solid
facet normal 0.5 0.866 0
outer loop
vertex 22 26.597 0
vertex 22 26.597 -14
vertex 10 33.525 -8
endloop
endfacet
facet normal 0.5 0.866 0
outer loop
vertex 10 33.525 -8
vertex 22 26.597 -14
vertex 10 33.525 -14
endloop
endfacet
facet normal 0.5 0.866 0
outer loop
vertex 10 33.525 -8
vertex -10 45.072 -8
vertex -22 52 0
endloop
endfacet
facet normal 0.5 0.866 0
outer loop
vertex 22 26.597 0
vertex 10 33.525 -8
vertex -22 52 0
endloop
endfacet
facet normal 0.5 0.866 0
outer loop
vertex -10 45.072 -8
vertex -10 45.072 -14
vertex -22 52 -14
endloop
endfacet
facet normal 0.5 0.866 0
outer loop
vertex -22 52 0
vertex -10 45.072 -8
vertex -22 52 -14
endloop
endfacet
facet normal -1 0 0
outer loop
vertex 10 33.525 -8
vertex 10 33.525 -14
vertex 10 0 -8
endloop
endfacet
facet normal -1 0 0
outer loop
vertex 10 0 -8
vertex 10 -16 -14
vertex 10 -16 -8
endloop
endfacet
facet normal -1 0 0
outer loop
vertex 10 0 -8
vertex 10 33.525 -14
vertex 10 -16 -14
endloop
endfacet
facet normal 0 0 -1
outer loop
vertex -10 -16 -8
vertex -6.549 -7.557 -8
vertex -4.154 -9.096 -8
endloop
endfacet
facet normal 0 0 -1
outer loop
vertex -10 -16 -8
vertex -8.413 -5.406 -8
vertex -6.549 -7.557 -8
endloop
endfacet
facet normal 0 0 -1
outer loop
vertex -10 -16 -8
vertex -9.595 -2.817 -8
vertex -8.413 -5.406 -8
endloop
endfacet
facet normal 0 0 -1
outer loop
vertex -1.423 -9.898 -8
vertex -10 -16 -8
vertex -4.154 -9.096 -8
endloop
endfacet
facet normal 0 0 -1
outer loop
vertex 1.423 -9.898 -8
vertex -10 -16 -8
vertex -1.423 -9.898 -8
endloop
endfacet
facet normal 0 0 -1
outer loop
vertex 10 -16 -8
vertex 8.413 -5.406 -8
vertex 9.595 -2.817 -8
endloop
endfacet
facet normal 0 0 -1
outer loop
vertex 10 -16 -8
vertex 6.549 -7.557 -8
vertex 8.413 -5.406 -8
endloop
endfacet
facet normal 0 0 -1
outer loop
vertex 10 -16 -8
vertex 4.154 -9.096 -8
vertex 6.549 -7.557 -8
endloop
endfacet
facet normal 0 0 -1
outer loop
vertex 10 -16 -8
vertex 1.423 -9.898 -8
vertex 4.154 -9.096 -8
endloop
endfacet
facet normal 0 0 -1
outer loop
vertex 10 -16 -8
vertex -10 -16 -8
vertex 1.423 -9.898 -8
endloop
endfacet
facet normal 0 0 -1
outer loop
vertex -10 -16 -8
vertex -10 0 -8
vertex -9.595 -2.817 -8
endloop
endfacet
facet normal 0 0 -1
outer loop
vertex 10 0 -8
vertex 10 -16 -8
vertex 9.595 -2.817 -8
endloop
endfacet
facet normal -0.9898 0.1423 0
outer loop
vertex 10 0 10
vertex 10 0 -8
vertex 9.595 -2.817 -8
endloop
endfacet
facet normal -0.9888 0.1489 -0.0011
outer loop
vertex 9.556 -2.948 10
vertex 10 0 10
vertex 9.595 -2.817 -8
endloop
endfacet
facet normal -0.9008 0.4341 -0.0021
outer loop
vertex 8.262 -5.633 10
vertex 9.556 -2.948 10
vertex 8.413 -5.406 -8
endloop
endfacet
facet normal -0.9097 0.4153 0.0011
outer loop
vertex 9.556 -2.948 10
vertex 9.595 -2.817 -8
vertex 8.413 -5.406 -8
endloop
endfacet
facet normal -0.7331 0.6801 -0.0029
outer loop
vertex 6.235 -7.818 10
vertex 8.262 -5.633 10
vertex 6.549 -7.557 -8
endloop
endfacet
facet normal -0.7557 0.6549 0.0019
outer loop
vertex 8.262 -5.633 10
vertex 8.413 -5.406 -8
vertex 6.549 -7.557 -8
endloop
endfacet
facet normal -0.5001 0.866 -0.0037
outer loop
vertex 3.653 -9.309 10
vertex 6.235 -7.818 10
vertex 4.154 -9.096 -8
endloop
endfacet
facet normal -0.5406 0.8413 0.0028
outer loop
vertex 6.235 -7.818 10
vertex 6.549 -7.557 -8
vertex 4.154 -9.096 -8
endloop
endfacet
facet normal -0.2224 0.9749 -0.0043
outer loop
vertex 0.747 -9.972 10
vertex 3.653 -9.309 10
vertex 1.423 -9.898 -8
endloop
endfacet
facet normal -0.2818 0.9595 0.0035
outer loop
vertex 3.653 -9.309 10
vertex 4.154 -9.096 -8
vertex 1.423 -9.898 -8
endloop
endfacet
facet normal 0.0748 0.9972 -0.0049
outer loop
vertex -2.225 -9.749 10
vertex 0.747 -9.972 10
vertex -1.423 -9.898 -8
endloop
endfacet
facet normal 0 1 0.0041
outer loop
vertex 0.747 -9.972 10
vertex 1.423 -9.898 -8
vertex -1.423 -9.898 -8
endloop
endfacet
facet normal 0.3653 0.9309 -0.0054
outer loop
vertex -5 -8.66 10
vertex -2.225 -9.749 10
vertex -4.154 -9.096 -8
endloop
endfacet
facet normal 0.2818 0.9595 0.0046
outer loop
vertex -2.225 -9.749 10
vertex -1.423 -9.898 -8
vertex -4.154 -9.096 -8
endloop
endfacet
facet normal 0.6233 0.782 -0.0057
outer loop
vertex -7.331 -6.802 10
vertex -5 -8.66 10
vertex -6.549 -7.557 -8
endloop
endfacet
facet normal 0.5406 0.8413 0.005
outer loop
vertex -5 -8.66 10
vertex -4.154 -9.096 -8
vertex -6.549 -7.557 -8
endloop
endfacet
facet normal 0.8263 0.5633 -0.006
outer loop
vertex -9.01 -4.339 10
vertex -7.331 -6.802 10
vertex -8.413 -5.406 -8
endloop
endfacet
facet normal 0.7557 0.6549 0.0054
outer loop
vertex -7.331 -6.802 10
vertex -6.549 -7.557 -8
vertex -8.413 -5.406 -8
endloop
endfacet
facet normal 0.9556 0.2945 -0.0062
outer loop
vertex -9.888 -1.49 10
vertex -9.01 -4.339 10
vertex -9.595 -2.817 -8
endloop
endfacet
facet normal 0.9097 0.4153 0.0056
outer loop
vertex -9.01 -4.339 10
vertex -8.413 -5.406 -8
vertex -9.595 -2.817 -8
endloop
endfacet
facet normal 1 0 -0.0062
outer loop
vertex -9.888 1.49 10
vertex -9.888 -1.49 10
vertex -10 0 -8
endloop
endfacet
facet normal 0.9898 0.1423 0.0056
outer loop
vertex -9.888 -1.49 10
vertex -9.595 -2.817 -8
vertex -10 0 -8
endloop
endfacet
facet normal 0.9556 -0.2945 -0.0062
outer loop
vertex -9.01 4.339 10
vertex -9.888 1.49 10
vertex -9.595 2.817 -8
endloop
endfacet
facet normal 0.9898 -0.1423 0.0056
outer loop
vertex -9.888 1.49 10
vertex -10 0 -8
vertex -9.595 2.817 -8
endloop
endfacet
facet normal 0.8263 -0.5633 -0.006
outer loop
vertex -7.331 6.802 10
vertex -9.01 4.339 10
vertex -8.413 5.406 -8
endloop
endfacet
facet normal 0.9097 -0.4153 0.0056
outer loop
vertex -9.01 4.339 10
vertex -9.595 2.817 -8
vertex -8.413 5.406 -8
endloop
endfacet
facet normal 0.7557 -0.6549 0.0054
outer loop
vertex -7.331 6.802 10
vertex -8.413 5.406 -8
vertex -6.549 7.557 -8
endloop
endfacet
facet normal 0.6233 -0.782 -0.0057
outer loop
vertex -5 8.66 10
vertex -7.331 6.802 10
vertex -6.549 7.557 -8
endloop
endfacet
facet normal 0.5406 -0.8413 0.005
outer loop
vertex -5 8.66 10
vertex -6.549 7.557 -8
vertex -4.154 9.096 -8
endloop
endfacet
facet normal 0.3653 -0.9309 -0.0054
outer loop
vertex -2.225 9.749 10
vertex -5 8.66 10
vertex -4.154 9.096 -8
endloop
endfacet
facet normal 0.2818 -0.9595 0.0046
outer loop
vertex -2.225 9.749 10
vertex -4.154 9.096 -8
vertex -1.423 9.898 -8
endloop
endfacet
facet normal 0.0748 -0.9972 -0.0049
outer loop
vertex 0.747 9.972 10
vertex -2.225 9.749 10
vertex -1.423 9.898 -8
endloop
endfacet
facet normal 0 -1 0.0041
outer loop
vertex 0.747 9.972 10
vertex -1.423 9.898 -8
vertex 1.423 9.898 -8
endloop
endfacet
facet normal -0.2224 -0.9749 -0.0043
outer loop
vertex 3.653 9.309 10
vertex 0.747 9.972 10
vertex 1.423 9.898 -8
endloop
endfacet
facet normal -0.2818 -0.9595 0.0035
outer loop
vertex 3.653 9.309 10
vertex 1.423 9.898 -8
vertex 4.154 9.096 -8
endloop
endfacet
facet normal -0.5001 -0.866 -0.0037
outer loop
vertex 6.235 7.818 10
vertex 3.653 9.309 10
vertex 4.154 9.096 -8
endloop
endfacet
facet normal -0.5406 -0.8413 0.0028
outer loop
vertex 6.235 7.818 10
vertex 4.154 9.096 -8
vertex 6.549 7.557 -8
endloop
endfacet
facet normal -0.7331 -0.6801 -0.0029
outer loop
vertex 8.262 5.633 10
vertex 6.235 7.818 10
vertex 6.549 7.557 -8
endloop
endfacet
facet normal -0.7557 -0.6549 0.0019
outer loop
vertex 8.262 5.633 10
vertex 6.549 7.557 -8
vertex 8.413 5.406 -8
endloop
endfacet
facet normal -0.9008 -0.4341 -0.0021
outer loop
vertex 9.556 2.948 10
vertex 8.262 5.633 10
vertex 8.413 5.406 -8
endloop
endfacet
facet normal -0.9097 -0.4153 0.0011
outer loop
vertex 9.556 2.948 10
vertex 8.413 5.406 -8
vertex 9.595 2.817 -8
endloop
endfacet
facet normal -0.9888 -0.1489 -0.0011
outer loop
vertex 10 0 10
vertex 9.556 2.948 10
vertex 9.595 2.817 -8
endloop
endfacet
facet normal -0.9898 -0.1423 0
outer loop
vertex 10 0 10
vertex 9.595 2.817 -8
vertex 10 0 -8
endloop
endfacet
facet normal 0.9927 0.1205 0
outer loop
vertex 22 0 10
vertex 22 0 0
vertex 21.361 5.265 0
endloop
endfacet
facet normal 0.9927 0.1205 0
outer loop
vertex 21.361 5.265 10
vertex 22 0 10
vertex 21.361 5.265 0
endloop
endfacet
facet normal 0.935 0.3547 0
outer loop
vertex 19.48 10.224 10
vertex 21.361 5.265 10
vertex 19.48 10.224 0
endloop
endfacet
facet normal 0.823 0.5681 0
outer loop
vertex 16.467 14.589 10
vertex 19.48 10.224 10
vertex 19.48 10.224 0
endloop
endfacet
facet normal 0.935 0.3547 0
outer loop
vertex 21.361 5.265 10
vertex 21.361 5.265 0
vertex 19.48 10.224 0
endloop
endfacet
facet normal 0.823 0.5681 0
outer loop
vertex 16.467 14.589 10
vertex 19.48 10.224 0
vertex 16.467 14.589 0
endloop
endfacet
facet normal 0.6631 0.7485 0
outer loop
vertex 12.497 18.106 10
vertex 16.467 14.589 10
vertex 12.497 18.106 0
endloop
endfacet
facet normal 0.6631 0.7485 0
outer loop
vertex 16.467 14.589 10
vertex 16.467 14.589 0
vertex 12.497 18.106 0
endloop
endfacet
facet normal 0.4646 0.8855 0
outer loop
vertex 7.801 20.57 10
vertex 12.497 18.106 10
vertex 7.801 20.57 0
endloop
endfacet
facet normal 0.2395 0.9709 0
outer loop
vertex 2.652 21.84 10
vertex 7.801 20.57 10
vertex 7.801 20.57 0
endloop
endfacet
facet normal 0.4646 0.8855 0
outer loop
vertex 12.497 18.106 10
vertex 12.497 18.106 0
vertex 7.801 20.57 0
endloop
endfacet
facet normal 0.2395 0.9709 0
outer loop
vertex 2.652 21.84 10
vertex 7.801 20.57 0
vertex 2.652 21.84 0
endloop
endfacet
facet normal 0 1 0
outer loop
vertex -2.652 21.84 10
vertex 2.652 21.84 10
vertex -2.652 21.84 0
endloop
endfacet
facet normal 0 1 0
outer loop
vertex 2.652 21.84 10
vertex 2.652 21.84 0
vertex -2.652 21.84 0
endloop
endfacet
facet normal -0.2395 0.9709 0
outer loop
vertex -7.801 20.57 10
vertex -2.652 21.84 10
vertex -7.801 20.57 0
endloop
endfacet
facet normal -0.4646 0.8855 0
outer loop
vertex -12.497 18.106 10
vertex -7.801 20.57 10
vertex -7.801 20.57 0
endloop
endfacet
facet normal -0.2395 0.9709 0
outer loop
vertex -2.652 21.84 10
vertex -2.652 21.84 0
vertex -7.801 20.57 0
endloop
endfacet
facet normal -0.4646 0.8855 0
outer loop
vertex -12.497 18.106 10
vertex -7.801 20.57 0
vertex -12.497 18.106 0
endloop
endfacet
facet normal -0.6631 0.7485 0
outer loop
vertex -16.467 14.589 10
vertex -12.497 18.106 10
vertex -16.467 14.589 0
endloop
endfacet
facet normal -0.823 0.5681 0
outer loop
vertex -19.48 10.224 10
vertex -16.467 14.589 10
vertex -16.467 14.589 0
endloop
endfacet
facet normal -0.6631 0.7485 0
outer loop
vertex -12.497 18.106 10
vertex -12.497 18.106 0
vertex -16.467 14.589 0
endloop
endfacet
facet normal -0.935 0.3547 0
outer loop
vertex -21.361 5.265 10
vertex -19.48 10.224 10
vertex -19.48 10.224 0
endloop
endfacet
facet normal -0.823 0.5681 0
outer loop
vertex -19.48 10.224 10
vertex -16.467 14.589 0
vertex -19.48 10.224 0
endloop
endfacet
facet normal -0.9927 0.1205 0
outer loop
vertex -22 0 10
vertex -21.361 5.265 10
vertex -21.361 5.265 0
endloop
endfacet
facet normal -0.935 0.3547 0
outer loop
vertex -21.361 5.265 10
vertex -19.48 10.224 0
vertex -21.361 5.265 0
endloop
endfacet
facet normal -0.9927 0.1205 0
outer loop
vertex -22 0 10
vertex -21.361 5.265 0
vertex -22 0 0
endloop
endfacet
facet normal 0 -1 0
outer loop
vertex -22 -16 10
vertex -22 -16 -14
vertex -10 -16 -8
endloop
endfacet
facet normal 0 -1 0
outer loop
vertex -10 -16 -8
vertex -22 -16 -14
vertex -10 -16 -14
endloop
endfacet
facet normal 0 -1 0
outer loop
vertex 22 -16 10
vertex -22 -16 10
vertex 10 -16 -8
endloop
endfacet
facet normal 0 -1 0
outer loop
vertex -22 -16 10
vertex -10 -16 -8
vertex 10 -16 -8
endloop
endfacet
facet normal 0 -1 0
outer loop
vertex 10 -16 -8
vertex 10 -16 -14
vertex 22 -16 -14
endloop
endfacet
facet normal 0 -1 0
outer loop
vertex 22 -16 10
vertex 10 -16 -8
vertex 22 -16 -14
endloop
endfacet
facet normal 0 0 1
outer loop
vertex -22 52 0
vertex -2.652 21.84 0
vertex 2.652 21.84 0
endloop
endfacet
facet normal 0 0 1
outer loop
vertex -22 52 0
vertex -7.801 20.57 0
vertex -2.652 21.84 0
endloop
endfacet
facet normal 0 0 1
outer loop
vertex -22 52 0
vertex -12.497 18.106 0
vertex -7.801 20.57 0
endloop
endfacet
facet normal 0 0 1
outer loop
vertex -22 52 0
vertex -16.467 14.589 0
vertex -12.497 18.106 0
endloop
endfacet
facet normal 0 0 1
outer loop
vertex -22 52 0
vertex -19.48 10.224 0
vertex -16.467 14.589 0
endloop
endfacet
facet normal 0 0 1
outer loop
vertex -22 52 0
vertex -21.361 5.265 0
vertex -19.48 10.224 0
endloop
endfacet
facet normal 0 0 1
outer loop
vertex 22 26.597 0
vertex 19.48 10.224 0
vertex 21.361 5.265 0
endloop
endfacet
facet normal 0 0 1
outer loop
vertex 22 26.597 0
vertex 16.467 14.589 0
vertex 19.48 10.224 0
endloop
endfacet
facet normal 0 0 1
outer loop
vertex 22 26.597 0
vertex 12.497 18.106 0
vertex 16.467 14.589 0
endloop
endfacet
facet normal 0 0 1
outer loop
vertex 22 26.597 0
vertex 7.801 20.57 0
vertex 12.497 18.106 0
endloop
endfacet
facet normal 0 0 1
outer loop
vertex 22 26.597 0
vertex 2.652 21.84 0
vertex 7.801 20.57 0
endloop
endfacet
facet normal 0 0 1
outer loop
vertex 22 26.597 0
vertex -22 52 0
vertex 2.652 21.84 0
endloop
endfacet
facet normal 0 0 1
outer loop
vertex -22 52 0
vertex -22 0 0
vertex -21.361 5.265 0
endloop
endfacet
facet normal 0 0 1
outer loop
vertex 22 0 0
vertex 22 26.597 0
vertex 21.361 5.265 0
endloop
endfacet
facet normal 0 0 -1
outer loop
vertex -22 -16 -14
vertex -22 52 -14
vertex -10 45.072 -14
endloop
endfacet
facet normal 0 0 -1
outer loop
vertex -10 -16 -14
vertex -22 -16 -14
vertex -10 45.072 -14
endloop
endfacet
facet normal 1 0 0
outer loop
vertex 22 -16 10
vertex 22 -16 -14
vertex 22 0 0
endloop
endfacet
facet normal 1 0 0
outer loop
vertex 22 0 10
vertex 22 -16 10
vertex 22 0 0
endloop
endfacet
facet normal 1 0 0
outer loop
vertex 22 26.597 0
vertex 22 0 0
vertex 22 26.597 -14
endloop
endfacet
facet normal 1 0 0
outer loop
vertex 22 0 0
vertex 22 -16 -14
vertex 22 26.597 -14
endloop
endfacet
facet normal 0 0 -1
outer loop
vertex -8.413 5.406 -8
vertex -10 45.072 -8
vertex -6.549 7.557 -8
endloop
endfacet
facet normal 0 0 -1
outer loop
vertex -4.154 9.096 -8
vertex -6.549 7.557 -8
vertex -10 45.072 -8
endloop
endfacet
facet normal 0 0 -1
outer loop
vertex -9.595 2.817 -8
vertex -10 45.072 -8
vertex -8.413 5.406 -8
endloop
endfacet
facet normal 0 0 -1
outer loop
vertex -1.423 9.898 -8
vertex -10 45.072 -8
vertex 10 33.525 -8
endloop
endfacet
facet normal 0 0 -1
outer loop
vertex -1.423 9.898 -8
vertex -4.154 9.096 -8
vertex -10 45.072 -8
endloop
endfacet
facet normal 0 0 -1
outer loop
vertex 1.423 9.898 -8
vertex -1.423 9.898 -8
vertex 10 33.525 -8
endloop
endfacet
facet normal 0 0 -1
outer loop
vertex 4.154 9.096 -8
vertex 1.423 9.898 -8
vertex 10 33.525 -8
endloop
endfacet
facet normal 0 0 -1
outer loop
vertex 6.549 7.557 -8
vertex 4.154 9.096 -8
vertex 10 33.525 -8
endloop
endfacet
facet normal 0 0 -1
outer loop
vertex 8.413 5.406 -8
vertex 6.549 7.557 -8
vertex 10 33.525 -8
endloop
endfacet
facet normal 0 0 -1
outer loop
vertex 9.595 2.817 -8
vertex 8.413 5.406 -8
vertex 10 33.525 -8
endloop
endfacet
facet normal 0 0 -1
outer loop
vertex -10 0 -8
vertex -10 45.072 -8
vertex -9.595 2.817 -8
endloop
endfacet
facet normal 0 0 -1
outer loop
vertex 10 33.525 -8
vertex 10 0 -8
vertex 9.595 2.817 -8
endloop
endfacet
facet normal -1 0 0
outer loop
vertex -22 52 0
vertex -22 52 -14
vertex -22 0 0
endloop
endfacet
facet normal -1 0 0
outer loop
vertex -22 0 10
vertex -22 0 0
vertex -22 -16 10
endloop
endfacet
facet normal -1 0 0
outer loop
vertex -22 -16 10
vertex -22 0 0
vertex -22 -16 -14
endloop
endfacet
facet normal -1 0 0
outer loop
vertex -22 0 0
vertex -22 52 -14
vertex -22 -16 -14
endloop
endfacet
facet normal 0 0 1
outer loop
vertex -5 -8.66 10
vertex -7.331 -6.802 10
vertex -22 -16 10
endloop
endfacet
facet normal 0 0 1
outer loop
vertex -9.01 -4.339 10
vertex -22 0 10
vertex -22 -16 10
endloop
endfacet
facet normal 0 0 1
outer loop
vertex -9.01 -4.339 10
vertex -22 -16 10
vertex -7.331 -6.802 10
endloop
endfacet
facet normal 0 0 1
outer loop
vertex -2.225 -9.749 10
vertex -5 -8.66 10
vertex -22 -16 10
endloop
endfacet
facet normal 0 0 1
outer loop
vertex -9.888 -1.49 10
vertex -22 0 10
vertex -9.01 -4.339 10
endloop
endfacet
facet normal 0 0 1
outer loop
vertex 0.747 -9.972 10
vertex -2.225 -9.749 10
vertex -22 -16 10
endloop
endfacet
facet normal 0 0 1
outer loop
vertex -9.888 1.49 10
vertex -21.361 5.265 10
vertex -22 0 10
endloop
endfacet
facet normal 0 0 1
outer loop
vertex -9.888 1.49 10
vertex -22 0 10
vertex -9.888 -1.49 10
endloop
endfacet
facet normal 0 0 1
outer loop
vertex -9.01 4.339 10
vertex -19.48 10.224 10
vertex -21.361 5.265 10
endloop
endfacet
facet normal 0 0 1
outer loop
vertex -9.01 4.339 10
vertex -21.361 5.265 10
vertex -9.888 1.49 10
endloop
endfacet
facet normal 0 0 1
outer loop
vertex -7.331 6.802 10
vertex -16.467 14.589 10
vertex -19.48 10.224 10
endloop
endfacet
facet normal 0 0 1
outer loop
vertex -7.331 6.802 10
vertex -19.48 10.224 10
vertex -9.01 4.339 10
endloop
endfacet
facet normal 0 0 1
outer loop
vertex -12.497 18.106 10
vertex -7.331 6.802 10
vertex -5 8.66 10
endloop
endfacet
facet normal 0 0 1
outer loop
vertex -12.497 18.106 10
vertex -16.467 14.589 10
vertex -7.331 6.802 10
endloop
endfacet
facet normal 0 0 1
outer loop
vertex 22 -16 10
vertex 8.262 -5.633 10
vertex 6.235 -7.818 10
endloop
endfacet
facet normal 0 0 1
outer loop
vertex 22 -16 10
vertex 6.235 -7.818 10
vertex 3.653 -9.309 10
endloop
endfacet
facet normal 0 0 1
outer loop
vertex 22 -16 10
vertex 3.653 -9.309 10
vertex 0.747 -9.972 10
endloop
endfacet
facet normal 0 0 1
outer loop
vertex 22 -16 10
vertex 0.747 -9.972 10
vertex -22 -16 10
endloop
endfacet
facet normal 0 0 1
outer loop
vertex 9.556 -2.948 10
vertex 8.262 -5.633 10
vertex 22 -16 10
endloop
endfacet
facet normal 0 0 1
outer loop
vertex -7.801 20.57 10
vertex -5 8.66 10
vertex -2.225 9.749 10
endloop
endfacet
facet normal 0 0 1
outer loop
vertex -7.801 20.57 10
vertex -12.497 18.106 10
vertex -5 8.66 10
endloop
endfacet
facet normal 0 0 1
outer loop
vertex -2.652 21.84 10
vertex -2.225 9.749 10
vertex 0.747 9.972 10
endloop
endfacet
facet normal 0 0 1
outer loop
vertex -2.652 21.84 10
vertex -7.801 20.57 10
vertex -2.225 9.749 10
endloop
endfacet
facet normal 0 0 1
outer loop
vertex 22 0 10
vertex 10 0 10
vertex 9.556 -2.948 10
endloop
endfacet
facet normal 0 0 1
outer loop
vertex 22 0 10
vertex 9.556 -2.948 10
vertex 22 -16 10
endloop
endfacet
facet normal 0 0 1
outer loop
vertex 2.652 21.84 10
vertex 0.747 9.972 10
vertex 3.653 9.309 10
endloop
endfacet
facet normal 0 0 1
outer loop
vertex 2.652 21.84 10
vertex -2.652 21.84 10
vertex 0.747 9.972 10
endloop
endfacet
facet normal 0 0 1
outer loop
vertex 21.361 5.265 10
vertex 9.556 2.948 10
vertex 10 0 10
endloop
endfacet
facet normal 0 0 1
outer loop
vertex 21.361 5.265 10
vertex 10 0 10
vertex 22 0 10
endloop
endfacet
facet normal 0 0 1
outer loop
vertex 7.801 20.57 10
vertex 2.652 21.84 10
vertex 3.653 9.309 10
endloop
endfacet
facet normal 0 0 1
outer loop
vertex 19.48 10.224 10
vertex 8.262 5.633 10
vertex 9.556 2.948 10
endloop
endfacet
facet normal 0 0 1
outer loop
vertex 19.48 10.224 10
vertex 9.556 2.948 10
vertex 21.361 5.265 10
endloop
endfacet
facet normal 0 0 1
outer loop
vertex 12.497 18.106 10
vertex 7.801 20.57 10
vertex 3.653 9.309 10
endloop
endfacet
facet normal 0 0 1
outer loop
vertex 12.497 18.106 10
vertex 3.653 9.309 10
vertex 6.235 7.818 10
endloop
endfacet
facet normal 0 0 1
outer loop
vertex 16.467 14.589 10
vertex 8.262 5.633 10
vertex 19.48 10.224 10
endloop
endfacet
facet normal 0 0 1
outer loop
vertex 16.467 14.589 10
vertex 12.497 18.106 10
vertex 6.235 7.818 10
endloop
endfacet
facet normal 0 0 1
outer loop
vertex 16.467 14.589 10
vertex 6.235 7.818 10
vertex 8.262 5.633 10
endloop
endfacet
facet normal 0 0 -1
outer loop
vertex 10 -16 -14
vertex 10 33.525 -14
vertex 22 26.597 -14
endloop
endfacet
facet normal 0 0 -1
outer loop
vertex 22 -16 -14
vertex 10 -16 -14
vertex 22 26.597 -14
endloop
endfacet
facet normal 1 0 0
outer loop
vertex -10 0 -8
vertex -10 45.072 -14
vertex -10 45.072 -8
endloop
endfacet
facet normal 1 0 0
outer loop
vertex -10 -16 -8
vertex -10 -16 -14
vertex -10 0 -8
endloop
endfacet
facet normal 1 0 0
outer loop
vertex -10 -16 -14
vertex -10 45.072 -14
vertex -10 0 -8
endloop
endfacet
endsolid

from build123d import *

# Parameters (mm, degrees)
SKETCH1_R           = 10
BOSS_EXTRUDE1_DEPTH = 10
BOSS_EXTRUDE2_START = -14
SKETCH1_3_R         = 10
BOSS_EXTRUDE2_DEPTH = 14
SKETCH3_W           = 20
SKETCH3_H           = 6
CUT_EXTRUDE2_DEPTH  = 73.828565824


with BuildPart() as part:
    # Sketch1 → Boss-Extrude1 (new body)
    with BuildSketch(Plane.XY):
        with BuildLine():
            Line((-22, 0), (-22, -16))
            Line((-22, -16), (22, -16))
            Line((22, -16), (22, 0))
            ThreePointArc((22, 0), (0, 22), (-22, 0))
        make_face()
        Circle(SKETCH1_R, mode=Mode.SUBTRACT)
    extrude(amount=BOSS_EXTRUDE1_DEPTH)

    # Sketch1<3> → Boss-Extrude2 (add)
    with BuildSketch(Plane.XY.offset(BOSS_EXTRUDE2_START)):
        Polygon((-22, -16), (22, -16), (22, 26.596588156), (-22, 52), align=None)
        Circle(SKETCH1_3_R, mode=Mode.SUBTRACT)
    extrude(amount=BOSS_EXTRUDE2_DEPTH)

    # Sketch3 → Cut-Extrude2 (cut, through all)
    with BuildSketch(Plane.XZ.offset(16)):
        with Locations((0, -11)):
            Rectangle(SKETCH3_W, SKETCH3_H)
    extrude(amount=-CUT_EXTRUDE2_DEPTH, mode=Mode.SUBTRACT)


solid = part.part
